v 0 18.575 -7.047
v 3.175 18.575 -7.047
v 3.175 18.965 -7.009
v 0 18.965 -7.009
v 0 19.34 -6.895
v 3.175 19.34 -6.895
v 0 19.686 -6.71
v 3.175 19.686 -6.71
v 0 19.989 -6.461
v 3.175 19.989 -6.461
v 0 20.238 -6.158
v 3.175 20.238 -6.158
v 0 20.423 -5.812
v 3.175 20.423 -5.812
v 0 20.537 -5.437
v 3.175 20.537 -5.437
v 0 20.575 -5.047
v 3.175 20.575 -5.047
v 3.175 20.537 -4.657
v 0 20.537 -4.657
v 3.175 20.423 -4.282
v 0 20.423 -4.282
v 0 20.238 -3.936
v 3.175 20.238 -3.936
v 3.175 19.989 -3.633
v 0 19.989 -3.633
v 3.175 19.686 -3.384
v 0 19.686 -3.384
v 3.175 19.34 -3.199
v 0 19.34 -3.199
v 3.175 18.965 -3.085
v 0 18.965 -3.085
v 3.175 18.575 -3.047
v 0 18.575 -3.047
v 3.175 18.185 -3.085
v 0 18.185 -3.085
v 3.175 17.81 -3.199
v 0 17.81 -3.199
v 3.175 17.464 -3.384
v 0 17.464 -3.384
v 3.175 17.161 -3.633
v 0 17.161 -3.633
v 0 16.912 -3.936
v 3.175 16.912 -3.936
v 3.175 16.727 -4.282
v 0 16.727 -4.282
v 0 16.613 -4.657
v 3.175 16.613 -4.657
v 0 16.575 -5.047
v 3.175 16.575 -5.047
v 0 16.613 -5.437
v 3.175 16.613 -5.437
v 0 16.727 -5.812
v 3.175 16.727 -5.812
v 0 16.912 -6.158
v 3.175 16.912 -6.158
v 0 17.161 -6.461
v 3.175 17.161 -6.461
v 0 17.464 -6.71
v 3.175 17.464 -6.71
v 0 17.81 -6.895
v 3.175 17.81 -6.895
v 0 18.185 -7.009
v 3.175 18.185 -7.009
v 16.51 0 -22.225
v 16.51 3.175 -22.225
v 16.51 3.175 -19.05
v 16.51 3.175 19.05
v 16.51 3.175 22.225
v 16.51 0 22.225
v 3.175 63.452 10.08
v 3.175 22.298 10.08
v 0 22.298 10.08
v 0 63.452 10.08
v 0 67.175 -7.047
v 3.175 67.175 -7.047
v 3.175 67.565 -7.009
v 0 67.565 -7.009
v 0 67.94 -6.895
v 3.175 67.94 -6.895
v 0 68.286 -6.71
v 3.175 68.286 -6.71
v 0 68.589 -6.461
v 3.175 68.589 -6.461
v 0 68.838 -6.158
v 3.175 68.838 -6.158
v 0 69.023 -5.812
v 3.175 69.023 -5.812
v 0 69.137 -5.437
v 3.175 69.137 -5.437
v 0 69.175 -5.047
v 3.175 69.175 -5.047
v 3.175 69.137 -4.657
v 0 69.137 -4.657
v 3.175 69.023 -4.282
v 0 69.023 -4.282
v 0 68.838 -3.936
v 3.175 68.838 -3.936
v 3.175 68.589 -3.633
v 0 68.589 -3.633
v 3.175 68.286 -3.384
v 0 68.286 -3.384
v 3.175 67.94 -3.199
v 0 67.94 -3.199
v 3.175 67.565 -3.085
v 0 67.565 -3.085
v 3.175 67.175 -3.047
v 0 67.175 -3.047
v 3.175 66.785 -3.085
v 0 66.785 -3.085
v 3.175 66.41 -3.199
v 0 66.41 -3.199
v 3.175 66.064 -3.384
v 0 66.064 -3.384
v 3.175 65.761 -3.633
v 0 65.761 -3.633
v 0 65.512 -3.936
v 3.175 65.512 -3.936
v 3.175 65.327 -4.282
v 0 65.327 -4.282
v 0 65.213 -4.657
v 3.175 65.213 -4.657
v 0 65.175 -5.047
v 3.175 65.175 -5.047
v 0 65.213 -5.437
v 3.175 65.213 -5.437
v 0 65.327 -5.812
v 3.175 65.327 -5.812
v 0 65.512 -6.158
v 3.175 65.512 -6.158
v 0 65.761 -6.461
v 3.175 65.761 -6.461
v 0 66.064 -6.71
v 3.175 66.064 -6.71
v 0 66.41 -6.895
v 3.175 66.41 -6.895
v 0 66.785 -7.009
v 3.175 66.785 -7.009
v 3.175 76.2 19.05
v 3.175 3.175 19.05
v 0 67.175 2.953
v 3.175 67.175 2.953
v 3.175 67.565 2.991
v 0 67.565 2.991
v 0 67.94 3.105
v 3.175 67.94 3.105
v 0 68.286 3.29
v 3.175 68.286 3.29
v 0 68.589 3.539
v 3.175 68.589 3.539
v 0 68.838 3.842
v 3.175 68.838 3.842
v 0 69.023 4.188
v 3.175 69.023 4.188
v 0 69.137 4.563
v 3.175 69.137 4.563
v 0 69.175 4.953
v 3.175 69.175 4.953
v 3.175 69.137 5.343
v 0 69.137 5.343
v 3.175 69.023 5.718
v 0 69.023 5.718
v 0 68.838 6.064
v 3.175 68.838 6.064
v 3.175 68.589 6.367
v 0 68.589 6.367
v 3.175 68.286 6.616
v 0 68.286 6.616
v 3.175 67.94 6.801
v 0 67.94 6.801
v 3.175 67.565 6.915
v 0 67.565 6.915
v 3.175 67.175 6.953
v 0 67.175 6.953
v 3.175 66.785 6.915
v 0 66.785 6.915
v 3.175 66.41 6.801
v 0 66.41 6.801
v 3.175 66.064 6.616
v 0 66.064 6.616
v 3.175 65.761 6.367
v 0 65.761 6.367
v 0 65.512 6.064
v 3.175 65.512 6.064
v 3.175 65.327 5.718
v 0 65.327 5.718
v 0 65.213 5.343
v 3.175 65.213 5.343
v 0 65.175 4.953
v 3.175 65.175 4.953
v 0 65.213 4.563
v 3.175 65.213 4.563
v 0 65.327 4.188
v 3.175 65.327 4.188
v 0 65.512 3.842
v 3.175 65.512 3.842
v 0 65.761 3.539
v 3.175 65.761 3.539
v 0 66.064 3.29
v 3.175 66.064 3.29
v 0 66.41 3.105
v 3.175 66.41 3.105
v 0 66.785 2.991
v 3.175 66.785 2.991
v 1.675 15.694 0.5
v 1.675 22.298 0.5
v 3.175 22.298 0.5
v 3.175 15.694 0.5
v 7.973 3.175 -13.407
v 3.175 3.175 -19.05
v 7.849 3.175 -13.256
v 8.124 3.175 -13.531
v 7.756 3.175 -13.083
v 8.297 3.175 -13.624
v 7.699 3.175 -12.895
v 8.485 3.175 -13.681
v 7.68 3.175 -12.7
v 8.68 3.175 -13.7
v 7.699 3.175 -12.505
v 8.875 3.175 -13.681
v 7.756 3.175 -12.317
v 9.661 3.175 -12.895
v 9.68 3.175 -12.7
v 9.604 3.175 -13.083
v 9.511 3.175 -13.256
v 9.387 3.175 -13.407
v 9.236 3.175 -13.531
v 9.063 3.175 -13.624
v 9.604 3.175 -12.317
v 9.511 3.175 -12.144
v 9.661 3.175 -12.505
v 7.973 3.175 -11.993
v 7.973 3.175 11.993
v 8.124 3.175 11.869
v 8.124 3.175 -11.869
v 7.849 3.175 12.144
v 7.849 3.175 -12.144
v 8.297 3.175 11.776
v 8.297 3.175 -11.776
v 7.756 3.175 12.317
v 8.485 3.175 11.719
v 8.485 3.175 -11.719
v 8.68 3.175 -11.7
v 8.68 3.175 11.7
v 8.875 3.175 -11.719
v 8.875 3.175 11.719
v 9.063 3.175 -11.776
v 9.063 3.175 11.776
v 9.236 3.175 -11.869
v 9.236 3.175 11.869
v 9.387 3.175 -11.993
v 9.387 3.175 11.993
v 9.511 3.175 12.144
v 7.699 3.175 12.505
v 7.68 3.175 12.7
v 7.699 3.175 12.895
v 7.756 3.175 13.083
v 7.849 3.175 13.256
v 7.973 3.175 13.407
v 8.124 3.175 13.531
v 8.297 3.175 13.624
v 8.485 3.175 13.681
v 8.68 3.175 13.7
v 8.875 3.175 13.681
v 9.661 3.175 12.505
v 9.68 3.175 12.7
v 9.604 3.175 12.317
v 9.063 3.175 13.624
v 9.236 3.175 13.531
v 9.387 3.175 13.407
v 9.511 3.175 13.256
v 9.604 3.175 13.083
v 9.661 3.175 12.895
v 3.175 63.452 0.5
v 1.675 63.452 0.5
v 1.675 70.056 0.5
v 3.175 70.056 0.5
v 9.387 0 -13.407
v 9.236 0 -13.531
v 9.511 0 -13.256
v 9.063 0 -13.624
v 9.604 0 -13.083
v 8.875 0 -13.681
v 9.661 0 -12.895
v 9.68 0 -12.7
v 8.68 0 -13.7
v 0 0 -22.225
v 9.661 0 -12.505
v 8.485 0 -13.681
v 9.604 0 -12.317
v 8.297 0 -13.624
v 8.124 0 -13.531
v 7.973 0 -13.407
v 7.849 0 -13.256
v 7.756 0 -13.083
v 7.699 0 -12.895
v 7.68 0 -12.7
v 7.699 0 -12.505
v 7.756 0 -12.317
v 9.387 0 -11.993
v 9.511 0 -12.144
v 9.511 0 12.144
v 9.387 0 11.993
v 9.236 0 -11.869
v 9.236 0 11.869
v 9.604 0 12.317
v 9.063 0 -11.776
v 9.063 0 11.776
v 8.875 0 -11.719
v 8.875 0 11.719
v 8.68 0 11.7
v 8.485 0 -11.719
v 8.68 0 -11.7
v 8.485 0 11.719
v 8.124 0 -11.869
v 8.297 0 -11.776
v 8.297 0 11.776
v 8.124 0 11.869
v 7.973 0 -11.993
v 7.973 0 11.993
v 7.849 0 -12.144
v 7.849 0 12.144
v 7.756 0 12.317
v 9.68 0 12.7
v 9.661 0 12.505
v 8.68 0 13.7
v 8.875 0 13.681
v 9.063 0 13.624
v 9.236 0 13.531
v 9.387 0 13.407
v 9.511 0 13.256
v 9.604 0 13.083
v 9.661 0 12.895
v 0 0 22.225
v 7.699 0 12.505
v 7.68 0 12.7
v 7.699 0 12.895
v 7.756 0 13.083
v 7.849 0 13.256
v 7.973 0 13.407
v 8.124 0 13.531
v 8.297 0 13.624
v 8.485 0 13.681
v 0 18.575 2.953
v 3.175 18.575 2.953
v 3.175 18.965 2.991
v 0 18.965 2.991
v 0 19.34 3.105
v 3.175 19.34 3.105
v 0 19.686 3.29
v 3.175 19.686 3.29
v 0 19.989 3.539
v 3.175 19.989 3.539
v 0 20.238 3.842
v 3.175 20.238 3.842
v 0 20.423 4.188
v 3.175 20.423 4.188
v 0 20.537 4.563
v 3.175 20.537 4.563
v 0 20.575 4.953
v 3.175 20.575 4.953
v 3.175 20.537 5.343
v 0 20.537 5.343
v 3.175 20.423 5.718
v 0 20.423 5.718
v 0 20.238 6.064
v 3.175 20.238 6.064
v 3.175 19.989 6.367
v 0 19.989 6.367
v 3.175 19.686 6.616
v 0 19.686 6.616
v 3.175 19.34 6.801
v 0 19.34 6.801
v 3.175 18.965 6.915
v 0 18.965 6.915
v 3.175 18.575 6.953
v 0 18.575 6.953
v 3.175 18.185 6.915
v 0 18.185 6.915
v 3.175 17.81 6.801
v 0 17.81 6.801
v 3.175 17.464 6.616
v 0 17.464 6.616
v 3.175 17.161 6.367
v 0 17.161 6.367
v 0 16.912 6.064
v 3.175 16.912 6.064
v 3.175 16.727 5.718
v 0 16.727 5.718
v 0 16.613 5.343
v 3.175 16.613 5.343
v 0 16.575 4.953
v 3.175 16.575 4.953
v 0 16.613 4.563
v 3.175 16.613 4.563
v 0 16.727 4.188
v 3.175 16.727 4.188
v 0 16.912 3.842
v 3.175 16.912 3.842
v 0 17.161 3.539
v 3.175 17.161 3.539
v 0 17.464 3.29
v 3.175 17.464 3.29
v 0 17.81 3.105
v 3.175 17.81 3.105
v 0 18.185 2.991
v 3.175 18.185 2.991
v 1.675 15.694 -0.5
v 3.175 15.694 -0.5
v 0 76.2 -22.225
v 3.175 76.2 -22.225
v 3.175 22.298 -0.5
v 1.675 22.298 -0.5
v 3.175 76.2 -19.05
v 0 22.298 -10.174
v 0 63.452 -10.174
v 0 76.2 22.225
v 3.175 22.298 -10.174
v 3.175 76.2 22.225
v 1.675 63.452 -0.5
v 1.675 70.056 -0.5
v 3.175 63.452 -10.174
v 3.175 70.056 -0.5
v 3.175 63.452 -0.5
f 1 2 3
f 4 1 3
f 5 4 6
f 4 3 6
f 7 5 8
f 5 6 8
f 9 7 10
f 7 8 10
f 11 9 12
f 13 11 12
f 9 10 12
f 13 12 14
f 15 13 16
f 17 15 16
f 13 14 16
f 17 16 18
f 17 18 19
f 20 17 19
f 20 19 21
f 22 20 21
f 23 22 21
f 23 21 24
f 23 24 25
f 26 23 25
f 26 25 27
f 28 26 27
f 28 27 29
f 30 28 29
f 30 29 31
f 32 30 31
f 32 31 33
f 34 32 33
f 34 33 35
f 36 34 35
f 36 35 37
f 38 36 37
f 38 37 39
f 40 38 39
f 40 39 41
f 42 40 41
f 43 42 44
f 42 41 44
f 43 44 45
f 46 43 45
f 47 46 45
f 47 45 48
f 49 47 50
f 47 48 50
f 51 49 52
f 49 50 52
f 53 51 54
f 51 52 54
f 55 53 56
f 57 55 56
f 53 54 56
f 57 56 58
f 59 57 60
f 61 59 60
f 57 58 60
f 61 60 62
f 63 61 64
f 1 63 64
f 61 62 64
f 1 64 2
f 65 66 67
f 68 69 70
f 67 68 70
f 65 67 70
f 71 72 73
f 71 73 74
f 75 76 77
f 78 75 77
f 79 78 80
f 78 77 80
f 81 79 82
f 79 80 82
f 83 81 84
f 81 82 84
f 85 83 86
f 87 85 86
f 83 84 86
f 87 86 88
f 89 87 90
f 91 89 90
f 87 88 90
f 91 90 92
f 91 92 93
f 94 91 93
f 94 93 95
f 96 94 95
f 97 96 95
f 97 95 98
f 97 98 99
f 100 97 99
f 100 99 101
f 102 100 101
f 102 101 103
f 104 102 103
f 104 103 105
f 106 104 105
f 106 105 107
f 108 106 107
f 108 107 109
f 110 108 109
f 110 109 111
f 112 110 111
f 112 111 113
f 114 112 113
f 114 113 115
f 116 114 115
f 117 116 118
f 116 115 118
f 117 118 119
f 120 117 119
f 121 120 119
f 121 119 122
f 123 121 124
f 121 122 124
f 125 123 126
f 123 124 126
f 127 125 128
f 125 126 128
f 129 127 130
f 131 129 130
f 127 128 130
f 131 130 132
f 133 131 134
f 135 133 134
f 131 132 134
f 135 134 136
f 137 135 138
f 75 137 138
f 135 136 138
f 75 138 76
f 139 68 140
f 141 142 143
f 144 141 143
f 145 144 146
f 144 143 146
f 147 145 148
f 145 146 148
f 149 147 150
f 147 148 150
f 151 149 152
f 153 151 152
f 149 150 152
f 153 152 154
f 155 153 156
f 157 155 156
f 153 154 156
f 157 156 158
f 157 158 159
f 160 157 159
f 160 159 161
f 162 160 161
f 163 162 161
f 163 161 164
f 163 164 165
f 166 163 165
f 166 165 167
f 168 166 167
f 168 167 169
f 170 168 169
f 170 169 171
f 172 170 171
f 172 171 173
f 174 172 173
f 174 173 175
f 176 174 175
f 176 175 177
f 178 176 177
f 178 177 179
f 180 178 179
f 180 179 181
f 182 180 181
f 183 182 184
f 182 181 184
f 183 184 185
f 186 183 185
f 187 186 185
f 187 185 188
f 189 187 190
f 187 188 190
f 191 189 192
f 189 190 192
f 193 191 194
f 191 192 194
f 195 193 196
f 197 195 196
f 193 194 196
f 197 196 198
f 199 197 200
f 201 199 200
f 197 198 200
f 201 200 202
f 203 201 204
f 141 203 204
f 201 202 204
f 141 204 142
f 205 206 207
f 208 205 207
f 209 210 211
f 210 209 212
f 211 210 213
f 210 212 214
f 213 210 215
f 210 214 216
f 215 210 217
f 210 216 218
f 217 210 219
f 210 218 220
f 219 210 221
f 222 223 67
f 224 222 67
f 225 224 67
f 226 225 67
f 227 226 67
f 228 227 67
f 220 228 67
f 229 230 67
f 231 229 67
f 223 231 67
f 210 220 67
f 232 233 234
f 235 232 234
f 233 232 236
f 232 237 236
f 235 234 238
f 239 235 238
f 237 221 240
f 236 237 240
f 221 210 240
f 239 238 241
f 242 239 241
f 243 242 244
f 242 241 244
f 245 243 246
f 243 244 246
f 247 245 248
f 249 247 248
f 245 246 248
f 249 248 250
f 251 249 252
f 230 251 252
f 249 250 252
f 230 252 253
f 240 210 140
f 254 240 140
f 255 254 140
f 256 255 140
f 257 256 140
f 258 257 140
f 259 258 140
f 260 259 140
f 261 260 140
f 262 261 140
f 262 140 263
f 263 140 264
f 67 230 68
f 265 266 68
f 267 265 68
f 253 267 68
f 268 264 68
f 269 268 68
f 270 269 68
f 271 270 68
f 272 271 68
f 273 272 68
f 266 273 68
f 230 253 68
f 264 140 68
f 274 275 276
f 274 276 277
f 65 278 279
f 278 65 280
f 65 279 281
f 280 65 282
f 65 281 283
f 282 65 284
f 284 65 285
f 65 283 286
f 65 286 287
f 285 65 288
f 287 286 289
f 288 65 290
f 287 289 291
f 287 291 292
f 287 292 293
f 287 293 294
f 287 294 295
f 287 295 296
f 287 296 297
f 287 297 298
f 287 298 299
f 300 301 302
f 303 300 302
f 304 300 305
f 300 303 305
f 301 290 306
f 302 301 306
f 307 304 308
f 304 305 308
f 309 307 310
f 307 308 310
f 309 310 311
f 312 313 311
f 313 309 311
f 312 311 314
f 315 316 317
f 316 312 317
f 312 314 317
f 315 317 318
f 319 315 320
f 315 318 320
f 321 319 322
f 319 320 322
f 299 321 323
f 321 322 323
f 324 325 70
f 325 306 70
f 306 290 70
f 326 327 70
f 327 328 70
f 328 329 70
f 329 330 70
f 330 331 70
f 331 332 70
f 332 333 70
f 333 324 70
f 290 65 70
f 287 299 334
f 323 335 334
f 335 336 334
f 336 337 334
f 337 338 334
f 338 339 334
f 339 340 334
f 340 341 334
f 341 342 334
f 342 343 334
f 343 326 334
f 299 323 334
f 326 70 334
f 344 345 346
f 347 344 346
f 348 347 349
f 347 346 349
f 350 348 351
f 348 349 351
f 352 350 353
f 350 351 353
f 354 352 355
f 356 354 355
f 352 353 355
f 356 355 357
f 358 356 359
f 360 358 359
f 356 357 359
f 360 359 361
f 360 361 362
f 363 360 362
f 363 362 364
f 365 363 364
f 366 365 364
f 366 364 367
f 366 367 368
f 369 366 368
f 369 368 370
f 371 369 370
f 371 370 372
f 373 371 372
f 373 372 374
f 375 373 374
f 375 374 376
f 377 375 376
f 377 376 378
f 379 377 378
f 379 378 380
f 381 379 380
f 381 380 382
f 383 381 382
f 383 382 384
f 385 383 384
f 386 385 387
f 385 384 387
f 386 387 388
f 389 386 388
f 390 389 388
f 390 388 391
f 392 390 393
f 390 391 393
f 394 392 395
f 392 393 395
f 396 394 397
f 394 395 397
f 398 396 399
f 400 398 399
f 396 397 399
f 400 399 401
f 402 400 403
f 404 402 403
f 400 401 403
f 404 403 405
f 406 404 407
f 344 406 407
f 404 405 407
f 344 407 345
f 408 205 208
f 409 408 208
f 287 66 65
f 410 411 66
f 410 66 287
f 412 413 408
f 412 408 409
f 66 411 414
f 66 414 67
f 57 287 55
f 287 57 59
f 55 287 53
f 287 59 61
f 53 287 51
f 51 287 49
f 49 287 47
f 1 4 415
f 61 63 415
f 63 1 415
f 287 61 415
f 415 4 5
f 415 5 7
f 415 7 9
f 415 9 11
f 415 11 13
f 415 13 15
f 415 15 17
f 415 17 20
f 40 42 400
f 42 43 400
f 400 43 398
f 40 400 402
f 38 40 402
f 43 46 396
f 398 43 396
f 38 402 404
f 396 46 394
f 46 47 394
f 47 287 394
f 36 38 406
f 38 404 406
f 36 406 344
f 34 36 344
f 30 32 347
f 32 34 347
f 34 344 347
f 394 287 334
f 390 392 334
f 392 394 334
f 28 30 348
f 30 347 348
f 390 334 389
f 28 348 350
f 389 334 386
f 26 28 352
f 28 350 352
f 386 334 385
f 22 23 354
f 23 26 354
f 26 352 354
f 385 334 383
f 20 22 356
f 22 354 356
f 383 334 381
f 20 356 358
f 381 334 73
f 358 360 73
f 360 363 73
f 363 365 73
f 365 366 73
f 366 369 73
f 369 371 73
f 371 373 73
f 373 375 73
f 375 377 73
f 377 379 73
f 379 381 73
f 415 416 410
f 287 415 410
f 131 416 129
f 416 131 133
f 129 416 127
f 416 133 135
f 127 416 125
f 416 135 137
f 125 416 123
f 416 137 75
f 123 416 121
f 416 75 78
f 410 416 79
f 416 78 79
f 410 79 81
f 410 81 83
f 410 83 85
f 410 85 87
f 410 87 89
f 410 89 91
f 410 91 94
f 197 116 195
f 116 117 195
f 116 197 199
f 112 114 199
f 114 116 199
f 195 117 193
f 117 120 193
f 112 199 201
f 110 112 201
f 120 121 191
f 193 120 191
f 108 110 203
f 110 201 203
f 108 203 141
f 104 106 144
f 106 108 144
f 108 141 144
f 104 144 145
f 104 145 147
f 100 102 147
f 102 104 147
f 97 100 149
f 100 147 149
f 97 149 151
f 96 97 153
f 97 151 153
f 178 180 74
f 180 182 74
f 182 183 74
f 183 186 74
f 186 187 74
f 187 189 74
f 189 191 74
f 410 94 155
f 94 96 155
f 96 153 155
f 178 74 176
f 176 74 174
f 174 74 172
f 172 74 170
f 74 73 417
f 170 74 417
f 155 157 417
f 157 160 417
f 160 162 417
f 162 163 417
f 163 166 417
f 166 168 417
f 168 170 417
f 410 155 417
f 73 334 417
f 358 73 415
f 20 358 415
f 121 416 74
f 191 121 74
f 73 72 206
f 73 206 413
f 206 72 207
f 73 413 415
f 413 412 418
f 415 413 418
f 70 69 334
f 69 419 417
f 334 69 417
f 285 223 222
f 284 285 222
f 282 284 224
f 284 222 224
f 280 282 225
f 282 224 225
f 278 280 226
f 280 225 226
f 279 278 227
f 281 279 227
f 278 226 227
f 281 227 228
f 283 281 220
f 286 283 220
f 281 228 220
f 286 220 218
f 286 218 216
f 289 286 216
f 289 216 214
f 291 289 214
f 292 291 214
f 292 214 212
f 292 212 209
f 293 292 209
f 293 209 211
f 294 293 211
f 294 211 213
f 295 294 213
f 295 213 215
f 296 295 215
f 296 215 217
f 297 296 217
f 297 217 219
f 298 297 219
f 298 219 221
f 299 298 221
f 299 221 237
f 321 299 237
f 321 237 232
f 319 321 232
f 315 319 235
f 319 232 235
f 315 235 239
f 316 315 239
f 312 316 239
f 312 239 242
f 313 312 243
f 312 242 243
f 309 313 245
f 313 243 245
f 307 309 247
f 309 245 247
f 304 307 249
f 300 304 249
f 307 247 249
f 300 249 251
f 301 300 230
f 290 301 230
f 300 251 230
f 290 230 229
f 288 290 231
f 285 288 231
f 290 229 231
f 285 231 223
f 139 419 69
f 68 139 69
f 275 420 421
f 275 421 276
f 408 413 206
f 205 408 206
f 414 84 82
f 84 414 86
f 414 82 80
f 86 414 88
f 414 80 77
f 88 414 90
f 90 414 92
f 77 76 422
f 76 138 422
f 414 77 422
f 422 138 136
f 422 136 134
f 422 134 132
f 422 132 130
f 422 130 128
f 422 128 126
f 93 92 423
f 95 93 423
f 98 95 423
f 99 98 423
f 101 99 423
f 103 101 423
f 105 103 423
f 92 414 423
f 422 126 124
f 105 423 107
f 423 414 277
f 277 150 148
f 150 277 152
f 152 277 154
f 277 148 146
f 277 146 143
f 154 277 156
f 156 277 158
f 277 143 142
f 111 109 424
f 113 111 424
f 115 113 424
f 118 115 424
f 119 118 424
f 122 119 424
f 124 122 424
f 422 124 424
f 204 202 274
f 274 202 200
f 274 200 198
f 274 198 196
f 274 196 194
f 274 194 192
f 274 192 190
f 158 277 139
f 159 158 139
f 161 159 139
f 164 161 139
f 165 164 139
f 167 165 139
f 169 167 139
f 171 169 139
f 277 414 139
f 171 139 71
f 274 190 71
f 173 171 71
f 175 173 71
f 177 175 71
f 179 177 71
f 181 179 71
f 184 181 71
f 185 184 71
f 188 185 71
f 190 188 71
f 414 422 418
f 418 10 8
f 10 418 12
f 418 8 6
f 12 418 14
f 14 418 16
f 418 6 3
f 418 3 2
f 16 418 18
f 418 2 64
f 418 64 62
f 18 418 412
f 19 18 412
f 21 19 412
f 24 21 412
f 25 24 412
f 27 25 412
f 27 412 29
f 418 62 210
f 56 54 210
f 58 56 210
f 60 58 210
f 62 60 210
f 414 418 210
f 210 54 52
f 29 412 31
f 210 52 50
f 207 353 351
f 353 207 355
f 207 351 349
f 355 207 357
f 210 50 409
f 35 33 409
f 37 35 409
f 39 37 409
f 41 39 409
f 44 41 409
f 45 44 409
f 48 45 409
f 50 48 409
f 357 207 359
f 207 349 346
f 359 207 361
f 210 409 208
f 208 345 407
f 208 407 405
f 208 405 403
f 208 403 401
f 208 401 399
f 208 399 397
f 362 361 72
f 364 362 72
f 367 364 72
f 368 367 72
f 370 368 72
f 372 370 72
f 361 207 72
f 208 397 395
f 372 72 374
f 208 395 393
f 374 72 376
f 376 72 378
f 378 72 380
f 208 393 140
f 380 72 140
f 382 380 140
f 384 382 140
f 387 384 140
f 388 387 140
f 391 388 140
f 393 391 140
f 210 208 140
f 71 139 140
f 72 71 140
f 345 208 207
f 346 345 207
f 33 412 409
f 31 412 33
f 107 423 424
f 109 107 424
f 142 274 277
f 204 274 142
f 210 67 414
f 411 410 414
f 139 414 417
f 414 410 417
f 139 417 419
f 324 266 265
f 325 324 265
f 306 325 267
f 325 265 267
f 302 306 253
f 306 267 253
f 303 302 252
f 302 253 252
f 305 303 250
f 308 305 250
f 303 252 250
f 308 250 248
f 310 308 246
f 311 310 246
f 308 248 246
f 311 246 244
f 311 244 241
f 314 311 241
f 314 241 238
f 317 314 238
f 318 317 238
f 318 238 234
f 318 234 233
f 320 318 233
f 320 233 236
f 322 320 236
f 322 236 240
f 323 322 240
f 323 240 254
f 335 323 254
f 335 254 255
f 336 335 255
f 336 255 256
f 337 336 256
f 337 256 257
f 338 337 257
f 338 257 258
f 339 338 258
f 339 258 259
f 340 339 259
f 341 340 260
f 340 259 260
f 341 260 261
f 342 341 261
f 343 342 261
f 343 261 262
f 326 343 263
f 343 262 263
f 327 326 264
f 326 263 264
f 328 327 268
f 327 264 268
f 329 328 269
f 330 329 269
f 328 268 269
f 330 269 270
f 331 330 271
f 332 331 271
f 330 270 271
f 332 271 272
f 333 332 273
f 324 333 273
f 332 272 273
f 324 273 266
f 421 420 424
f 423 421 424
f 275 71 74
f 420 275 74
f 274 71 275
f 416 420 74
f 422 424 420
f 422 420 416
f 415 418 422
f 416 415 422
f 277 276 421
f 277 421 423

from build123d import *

# Parameters (mm, degrees)
BOSS_EXTRUDE1_DEPTH = 22.225
BOSS_EXTRUDE2_DEPTH = 3.175
SKETCH4_R           = 1.000000032
CUT_EXTRUDE2_DEPTH  = 4.175
SKETCH5_R           = 2.000000064
CUT_EXTRUDE3_DEPTH  = 4.175
SKETCH6_W           = 20.253999878
SKETCH6_H           = 41.153999988
CUT_EXTRUDE4_DEPTH  = 4.175
SKETCH7_W           = 1.500000048
SKETCH7_H           = 1.000000032
CUT_EXTRUDE5_DEPTH  = 6.604
CUT_EXTRUDE6_START  = 41.154
SKETCH7_2_W         = 1.500000048
SKETCH7_2_H         = 1.000000032
CUT_EXTRUDE6_DEPTH  = 6.604


with BuildPart() as part:
    # Sketch1 → Boss-Extrude1 (new body, symmetric)
    with BuildSketch(Plane.XY):
        Polygon((0, 0), (0, 76.2), (3.175, 76.2), (3.175, 3.175), (16.51, 3.175), (16.51, 0), align=None)
    extrude(amount=BOSS_EXTRUDE1_DEPTH, both=True)

    # Sketch3 → Boss-Extrude2 (add)
    with BuildSketch(Plane.XY.offset(22.225)):
        Polygon((3.175, 76.2), (16.51, 3.175), (3.175, 3.175), align=None)
    boss_extrude2 = extrude(amount=-BOSS_EXTRUDE2_DEPTH)

    # Mirror1: Boss-Extrude2 across plane
    add(boss_extrude2.mirror(Plane.XY))

    # Sketch4 → Cut-Extrude2 (cut, through all)
    with BuildSketch(Plane(origin=(0, 3.175, 0), x_dir=(1, 0, 0), z_dir=(0, 1, 0))):
        with Locations((8.679999912, 12.7)):
            Circle(SKETCH4_R)
        with Locations((8.679999912, -12.7)):
            Circle(SKETCH4_R)
    extrude(amount=-CUT_EXTRUDE2_DEPTH, mode=Mode.SUBTRACT)

    # Sketch5 → Cut-Extrude3 (cut, through all)
    with BuildSketch(Plane(origin=(3.175, 0, 0), x_dir=(0, 0, -1), z_dir=(1, 0, 0))):
        with Locations((-4.953, 18.574999934)):
            Circle(SKETCH5_R)
        with Locations((5.047000066, 18.574999934)):
            Circle(SKETCH5_R)
        with Locations((-4.953, 67.175000016)):
            Circle(SKETCH5_R)
        with Locations((5.047000066, 67.175000016)):
            Circle(SKETCH5_R)
    extrude(amount=-CUT_EXTRUDE3_DEPTH, mode=Mode.SUBTRACT)

    # Sketch6 → Cut-Extrude4 (cut, through all)
    with BuildSketch(Plane(origin=(3.175, 0, 0), x_dir=(0, 0, -1), z_dir=(1, 0, 0))):
        with Locations((0.047000033, 42.874999975)):
            Rectangle(SKETCH6_W, SKETCH6_H)
    extrude(amount=-CUT_EXTRUDE4_DEPTH, mode=Mode.SUBTRACT)

    # Sketch7 → Cut-Extrude5 (cut)
    with BuildSketch(Plane.XZ.offset(-63.451999969)):
        with Locations((2.424999976, 0)):
            Rectangle(SKETCH7_W, SKETCH7_H)
    extrude(amount=-CUT_EXTRUDE5_DEPTH, mode=Mode.SUBTRACT)

    # Sketch7<2> → Cut-Extrude6 (cut)
    with BuildSketch(Plane.XZ.offset(-63.451999969).offset(CUT_EXTRUDE6_START)):
        with Locations((2.424999976, 0)):
            Rectangle(SKETCH7_2_W, SKETCH7_2_H)
    extrude(amount=CUT_EXTRUDE6_DEPTH, mode=Mode.SUBTRACT)


solid = part.part
